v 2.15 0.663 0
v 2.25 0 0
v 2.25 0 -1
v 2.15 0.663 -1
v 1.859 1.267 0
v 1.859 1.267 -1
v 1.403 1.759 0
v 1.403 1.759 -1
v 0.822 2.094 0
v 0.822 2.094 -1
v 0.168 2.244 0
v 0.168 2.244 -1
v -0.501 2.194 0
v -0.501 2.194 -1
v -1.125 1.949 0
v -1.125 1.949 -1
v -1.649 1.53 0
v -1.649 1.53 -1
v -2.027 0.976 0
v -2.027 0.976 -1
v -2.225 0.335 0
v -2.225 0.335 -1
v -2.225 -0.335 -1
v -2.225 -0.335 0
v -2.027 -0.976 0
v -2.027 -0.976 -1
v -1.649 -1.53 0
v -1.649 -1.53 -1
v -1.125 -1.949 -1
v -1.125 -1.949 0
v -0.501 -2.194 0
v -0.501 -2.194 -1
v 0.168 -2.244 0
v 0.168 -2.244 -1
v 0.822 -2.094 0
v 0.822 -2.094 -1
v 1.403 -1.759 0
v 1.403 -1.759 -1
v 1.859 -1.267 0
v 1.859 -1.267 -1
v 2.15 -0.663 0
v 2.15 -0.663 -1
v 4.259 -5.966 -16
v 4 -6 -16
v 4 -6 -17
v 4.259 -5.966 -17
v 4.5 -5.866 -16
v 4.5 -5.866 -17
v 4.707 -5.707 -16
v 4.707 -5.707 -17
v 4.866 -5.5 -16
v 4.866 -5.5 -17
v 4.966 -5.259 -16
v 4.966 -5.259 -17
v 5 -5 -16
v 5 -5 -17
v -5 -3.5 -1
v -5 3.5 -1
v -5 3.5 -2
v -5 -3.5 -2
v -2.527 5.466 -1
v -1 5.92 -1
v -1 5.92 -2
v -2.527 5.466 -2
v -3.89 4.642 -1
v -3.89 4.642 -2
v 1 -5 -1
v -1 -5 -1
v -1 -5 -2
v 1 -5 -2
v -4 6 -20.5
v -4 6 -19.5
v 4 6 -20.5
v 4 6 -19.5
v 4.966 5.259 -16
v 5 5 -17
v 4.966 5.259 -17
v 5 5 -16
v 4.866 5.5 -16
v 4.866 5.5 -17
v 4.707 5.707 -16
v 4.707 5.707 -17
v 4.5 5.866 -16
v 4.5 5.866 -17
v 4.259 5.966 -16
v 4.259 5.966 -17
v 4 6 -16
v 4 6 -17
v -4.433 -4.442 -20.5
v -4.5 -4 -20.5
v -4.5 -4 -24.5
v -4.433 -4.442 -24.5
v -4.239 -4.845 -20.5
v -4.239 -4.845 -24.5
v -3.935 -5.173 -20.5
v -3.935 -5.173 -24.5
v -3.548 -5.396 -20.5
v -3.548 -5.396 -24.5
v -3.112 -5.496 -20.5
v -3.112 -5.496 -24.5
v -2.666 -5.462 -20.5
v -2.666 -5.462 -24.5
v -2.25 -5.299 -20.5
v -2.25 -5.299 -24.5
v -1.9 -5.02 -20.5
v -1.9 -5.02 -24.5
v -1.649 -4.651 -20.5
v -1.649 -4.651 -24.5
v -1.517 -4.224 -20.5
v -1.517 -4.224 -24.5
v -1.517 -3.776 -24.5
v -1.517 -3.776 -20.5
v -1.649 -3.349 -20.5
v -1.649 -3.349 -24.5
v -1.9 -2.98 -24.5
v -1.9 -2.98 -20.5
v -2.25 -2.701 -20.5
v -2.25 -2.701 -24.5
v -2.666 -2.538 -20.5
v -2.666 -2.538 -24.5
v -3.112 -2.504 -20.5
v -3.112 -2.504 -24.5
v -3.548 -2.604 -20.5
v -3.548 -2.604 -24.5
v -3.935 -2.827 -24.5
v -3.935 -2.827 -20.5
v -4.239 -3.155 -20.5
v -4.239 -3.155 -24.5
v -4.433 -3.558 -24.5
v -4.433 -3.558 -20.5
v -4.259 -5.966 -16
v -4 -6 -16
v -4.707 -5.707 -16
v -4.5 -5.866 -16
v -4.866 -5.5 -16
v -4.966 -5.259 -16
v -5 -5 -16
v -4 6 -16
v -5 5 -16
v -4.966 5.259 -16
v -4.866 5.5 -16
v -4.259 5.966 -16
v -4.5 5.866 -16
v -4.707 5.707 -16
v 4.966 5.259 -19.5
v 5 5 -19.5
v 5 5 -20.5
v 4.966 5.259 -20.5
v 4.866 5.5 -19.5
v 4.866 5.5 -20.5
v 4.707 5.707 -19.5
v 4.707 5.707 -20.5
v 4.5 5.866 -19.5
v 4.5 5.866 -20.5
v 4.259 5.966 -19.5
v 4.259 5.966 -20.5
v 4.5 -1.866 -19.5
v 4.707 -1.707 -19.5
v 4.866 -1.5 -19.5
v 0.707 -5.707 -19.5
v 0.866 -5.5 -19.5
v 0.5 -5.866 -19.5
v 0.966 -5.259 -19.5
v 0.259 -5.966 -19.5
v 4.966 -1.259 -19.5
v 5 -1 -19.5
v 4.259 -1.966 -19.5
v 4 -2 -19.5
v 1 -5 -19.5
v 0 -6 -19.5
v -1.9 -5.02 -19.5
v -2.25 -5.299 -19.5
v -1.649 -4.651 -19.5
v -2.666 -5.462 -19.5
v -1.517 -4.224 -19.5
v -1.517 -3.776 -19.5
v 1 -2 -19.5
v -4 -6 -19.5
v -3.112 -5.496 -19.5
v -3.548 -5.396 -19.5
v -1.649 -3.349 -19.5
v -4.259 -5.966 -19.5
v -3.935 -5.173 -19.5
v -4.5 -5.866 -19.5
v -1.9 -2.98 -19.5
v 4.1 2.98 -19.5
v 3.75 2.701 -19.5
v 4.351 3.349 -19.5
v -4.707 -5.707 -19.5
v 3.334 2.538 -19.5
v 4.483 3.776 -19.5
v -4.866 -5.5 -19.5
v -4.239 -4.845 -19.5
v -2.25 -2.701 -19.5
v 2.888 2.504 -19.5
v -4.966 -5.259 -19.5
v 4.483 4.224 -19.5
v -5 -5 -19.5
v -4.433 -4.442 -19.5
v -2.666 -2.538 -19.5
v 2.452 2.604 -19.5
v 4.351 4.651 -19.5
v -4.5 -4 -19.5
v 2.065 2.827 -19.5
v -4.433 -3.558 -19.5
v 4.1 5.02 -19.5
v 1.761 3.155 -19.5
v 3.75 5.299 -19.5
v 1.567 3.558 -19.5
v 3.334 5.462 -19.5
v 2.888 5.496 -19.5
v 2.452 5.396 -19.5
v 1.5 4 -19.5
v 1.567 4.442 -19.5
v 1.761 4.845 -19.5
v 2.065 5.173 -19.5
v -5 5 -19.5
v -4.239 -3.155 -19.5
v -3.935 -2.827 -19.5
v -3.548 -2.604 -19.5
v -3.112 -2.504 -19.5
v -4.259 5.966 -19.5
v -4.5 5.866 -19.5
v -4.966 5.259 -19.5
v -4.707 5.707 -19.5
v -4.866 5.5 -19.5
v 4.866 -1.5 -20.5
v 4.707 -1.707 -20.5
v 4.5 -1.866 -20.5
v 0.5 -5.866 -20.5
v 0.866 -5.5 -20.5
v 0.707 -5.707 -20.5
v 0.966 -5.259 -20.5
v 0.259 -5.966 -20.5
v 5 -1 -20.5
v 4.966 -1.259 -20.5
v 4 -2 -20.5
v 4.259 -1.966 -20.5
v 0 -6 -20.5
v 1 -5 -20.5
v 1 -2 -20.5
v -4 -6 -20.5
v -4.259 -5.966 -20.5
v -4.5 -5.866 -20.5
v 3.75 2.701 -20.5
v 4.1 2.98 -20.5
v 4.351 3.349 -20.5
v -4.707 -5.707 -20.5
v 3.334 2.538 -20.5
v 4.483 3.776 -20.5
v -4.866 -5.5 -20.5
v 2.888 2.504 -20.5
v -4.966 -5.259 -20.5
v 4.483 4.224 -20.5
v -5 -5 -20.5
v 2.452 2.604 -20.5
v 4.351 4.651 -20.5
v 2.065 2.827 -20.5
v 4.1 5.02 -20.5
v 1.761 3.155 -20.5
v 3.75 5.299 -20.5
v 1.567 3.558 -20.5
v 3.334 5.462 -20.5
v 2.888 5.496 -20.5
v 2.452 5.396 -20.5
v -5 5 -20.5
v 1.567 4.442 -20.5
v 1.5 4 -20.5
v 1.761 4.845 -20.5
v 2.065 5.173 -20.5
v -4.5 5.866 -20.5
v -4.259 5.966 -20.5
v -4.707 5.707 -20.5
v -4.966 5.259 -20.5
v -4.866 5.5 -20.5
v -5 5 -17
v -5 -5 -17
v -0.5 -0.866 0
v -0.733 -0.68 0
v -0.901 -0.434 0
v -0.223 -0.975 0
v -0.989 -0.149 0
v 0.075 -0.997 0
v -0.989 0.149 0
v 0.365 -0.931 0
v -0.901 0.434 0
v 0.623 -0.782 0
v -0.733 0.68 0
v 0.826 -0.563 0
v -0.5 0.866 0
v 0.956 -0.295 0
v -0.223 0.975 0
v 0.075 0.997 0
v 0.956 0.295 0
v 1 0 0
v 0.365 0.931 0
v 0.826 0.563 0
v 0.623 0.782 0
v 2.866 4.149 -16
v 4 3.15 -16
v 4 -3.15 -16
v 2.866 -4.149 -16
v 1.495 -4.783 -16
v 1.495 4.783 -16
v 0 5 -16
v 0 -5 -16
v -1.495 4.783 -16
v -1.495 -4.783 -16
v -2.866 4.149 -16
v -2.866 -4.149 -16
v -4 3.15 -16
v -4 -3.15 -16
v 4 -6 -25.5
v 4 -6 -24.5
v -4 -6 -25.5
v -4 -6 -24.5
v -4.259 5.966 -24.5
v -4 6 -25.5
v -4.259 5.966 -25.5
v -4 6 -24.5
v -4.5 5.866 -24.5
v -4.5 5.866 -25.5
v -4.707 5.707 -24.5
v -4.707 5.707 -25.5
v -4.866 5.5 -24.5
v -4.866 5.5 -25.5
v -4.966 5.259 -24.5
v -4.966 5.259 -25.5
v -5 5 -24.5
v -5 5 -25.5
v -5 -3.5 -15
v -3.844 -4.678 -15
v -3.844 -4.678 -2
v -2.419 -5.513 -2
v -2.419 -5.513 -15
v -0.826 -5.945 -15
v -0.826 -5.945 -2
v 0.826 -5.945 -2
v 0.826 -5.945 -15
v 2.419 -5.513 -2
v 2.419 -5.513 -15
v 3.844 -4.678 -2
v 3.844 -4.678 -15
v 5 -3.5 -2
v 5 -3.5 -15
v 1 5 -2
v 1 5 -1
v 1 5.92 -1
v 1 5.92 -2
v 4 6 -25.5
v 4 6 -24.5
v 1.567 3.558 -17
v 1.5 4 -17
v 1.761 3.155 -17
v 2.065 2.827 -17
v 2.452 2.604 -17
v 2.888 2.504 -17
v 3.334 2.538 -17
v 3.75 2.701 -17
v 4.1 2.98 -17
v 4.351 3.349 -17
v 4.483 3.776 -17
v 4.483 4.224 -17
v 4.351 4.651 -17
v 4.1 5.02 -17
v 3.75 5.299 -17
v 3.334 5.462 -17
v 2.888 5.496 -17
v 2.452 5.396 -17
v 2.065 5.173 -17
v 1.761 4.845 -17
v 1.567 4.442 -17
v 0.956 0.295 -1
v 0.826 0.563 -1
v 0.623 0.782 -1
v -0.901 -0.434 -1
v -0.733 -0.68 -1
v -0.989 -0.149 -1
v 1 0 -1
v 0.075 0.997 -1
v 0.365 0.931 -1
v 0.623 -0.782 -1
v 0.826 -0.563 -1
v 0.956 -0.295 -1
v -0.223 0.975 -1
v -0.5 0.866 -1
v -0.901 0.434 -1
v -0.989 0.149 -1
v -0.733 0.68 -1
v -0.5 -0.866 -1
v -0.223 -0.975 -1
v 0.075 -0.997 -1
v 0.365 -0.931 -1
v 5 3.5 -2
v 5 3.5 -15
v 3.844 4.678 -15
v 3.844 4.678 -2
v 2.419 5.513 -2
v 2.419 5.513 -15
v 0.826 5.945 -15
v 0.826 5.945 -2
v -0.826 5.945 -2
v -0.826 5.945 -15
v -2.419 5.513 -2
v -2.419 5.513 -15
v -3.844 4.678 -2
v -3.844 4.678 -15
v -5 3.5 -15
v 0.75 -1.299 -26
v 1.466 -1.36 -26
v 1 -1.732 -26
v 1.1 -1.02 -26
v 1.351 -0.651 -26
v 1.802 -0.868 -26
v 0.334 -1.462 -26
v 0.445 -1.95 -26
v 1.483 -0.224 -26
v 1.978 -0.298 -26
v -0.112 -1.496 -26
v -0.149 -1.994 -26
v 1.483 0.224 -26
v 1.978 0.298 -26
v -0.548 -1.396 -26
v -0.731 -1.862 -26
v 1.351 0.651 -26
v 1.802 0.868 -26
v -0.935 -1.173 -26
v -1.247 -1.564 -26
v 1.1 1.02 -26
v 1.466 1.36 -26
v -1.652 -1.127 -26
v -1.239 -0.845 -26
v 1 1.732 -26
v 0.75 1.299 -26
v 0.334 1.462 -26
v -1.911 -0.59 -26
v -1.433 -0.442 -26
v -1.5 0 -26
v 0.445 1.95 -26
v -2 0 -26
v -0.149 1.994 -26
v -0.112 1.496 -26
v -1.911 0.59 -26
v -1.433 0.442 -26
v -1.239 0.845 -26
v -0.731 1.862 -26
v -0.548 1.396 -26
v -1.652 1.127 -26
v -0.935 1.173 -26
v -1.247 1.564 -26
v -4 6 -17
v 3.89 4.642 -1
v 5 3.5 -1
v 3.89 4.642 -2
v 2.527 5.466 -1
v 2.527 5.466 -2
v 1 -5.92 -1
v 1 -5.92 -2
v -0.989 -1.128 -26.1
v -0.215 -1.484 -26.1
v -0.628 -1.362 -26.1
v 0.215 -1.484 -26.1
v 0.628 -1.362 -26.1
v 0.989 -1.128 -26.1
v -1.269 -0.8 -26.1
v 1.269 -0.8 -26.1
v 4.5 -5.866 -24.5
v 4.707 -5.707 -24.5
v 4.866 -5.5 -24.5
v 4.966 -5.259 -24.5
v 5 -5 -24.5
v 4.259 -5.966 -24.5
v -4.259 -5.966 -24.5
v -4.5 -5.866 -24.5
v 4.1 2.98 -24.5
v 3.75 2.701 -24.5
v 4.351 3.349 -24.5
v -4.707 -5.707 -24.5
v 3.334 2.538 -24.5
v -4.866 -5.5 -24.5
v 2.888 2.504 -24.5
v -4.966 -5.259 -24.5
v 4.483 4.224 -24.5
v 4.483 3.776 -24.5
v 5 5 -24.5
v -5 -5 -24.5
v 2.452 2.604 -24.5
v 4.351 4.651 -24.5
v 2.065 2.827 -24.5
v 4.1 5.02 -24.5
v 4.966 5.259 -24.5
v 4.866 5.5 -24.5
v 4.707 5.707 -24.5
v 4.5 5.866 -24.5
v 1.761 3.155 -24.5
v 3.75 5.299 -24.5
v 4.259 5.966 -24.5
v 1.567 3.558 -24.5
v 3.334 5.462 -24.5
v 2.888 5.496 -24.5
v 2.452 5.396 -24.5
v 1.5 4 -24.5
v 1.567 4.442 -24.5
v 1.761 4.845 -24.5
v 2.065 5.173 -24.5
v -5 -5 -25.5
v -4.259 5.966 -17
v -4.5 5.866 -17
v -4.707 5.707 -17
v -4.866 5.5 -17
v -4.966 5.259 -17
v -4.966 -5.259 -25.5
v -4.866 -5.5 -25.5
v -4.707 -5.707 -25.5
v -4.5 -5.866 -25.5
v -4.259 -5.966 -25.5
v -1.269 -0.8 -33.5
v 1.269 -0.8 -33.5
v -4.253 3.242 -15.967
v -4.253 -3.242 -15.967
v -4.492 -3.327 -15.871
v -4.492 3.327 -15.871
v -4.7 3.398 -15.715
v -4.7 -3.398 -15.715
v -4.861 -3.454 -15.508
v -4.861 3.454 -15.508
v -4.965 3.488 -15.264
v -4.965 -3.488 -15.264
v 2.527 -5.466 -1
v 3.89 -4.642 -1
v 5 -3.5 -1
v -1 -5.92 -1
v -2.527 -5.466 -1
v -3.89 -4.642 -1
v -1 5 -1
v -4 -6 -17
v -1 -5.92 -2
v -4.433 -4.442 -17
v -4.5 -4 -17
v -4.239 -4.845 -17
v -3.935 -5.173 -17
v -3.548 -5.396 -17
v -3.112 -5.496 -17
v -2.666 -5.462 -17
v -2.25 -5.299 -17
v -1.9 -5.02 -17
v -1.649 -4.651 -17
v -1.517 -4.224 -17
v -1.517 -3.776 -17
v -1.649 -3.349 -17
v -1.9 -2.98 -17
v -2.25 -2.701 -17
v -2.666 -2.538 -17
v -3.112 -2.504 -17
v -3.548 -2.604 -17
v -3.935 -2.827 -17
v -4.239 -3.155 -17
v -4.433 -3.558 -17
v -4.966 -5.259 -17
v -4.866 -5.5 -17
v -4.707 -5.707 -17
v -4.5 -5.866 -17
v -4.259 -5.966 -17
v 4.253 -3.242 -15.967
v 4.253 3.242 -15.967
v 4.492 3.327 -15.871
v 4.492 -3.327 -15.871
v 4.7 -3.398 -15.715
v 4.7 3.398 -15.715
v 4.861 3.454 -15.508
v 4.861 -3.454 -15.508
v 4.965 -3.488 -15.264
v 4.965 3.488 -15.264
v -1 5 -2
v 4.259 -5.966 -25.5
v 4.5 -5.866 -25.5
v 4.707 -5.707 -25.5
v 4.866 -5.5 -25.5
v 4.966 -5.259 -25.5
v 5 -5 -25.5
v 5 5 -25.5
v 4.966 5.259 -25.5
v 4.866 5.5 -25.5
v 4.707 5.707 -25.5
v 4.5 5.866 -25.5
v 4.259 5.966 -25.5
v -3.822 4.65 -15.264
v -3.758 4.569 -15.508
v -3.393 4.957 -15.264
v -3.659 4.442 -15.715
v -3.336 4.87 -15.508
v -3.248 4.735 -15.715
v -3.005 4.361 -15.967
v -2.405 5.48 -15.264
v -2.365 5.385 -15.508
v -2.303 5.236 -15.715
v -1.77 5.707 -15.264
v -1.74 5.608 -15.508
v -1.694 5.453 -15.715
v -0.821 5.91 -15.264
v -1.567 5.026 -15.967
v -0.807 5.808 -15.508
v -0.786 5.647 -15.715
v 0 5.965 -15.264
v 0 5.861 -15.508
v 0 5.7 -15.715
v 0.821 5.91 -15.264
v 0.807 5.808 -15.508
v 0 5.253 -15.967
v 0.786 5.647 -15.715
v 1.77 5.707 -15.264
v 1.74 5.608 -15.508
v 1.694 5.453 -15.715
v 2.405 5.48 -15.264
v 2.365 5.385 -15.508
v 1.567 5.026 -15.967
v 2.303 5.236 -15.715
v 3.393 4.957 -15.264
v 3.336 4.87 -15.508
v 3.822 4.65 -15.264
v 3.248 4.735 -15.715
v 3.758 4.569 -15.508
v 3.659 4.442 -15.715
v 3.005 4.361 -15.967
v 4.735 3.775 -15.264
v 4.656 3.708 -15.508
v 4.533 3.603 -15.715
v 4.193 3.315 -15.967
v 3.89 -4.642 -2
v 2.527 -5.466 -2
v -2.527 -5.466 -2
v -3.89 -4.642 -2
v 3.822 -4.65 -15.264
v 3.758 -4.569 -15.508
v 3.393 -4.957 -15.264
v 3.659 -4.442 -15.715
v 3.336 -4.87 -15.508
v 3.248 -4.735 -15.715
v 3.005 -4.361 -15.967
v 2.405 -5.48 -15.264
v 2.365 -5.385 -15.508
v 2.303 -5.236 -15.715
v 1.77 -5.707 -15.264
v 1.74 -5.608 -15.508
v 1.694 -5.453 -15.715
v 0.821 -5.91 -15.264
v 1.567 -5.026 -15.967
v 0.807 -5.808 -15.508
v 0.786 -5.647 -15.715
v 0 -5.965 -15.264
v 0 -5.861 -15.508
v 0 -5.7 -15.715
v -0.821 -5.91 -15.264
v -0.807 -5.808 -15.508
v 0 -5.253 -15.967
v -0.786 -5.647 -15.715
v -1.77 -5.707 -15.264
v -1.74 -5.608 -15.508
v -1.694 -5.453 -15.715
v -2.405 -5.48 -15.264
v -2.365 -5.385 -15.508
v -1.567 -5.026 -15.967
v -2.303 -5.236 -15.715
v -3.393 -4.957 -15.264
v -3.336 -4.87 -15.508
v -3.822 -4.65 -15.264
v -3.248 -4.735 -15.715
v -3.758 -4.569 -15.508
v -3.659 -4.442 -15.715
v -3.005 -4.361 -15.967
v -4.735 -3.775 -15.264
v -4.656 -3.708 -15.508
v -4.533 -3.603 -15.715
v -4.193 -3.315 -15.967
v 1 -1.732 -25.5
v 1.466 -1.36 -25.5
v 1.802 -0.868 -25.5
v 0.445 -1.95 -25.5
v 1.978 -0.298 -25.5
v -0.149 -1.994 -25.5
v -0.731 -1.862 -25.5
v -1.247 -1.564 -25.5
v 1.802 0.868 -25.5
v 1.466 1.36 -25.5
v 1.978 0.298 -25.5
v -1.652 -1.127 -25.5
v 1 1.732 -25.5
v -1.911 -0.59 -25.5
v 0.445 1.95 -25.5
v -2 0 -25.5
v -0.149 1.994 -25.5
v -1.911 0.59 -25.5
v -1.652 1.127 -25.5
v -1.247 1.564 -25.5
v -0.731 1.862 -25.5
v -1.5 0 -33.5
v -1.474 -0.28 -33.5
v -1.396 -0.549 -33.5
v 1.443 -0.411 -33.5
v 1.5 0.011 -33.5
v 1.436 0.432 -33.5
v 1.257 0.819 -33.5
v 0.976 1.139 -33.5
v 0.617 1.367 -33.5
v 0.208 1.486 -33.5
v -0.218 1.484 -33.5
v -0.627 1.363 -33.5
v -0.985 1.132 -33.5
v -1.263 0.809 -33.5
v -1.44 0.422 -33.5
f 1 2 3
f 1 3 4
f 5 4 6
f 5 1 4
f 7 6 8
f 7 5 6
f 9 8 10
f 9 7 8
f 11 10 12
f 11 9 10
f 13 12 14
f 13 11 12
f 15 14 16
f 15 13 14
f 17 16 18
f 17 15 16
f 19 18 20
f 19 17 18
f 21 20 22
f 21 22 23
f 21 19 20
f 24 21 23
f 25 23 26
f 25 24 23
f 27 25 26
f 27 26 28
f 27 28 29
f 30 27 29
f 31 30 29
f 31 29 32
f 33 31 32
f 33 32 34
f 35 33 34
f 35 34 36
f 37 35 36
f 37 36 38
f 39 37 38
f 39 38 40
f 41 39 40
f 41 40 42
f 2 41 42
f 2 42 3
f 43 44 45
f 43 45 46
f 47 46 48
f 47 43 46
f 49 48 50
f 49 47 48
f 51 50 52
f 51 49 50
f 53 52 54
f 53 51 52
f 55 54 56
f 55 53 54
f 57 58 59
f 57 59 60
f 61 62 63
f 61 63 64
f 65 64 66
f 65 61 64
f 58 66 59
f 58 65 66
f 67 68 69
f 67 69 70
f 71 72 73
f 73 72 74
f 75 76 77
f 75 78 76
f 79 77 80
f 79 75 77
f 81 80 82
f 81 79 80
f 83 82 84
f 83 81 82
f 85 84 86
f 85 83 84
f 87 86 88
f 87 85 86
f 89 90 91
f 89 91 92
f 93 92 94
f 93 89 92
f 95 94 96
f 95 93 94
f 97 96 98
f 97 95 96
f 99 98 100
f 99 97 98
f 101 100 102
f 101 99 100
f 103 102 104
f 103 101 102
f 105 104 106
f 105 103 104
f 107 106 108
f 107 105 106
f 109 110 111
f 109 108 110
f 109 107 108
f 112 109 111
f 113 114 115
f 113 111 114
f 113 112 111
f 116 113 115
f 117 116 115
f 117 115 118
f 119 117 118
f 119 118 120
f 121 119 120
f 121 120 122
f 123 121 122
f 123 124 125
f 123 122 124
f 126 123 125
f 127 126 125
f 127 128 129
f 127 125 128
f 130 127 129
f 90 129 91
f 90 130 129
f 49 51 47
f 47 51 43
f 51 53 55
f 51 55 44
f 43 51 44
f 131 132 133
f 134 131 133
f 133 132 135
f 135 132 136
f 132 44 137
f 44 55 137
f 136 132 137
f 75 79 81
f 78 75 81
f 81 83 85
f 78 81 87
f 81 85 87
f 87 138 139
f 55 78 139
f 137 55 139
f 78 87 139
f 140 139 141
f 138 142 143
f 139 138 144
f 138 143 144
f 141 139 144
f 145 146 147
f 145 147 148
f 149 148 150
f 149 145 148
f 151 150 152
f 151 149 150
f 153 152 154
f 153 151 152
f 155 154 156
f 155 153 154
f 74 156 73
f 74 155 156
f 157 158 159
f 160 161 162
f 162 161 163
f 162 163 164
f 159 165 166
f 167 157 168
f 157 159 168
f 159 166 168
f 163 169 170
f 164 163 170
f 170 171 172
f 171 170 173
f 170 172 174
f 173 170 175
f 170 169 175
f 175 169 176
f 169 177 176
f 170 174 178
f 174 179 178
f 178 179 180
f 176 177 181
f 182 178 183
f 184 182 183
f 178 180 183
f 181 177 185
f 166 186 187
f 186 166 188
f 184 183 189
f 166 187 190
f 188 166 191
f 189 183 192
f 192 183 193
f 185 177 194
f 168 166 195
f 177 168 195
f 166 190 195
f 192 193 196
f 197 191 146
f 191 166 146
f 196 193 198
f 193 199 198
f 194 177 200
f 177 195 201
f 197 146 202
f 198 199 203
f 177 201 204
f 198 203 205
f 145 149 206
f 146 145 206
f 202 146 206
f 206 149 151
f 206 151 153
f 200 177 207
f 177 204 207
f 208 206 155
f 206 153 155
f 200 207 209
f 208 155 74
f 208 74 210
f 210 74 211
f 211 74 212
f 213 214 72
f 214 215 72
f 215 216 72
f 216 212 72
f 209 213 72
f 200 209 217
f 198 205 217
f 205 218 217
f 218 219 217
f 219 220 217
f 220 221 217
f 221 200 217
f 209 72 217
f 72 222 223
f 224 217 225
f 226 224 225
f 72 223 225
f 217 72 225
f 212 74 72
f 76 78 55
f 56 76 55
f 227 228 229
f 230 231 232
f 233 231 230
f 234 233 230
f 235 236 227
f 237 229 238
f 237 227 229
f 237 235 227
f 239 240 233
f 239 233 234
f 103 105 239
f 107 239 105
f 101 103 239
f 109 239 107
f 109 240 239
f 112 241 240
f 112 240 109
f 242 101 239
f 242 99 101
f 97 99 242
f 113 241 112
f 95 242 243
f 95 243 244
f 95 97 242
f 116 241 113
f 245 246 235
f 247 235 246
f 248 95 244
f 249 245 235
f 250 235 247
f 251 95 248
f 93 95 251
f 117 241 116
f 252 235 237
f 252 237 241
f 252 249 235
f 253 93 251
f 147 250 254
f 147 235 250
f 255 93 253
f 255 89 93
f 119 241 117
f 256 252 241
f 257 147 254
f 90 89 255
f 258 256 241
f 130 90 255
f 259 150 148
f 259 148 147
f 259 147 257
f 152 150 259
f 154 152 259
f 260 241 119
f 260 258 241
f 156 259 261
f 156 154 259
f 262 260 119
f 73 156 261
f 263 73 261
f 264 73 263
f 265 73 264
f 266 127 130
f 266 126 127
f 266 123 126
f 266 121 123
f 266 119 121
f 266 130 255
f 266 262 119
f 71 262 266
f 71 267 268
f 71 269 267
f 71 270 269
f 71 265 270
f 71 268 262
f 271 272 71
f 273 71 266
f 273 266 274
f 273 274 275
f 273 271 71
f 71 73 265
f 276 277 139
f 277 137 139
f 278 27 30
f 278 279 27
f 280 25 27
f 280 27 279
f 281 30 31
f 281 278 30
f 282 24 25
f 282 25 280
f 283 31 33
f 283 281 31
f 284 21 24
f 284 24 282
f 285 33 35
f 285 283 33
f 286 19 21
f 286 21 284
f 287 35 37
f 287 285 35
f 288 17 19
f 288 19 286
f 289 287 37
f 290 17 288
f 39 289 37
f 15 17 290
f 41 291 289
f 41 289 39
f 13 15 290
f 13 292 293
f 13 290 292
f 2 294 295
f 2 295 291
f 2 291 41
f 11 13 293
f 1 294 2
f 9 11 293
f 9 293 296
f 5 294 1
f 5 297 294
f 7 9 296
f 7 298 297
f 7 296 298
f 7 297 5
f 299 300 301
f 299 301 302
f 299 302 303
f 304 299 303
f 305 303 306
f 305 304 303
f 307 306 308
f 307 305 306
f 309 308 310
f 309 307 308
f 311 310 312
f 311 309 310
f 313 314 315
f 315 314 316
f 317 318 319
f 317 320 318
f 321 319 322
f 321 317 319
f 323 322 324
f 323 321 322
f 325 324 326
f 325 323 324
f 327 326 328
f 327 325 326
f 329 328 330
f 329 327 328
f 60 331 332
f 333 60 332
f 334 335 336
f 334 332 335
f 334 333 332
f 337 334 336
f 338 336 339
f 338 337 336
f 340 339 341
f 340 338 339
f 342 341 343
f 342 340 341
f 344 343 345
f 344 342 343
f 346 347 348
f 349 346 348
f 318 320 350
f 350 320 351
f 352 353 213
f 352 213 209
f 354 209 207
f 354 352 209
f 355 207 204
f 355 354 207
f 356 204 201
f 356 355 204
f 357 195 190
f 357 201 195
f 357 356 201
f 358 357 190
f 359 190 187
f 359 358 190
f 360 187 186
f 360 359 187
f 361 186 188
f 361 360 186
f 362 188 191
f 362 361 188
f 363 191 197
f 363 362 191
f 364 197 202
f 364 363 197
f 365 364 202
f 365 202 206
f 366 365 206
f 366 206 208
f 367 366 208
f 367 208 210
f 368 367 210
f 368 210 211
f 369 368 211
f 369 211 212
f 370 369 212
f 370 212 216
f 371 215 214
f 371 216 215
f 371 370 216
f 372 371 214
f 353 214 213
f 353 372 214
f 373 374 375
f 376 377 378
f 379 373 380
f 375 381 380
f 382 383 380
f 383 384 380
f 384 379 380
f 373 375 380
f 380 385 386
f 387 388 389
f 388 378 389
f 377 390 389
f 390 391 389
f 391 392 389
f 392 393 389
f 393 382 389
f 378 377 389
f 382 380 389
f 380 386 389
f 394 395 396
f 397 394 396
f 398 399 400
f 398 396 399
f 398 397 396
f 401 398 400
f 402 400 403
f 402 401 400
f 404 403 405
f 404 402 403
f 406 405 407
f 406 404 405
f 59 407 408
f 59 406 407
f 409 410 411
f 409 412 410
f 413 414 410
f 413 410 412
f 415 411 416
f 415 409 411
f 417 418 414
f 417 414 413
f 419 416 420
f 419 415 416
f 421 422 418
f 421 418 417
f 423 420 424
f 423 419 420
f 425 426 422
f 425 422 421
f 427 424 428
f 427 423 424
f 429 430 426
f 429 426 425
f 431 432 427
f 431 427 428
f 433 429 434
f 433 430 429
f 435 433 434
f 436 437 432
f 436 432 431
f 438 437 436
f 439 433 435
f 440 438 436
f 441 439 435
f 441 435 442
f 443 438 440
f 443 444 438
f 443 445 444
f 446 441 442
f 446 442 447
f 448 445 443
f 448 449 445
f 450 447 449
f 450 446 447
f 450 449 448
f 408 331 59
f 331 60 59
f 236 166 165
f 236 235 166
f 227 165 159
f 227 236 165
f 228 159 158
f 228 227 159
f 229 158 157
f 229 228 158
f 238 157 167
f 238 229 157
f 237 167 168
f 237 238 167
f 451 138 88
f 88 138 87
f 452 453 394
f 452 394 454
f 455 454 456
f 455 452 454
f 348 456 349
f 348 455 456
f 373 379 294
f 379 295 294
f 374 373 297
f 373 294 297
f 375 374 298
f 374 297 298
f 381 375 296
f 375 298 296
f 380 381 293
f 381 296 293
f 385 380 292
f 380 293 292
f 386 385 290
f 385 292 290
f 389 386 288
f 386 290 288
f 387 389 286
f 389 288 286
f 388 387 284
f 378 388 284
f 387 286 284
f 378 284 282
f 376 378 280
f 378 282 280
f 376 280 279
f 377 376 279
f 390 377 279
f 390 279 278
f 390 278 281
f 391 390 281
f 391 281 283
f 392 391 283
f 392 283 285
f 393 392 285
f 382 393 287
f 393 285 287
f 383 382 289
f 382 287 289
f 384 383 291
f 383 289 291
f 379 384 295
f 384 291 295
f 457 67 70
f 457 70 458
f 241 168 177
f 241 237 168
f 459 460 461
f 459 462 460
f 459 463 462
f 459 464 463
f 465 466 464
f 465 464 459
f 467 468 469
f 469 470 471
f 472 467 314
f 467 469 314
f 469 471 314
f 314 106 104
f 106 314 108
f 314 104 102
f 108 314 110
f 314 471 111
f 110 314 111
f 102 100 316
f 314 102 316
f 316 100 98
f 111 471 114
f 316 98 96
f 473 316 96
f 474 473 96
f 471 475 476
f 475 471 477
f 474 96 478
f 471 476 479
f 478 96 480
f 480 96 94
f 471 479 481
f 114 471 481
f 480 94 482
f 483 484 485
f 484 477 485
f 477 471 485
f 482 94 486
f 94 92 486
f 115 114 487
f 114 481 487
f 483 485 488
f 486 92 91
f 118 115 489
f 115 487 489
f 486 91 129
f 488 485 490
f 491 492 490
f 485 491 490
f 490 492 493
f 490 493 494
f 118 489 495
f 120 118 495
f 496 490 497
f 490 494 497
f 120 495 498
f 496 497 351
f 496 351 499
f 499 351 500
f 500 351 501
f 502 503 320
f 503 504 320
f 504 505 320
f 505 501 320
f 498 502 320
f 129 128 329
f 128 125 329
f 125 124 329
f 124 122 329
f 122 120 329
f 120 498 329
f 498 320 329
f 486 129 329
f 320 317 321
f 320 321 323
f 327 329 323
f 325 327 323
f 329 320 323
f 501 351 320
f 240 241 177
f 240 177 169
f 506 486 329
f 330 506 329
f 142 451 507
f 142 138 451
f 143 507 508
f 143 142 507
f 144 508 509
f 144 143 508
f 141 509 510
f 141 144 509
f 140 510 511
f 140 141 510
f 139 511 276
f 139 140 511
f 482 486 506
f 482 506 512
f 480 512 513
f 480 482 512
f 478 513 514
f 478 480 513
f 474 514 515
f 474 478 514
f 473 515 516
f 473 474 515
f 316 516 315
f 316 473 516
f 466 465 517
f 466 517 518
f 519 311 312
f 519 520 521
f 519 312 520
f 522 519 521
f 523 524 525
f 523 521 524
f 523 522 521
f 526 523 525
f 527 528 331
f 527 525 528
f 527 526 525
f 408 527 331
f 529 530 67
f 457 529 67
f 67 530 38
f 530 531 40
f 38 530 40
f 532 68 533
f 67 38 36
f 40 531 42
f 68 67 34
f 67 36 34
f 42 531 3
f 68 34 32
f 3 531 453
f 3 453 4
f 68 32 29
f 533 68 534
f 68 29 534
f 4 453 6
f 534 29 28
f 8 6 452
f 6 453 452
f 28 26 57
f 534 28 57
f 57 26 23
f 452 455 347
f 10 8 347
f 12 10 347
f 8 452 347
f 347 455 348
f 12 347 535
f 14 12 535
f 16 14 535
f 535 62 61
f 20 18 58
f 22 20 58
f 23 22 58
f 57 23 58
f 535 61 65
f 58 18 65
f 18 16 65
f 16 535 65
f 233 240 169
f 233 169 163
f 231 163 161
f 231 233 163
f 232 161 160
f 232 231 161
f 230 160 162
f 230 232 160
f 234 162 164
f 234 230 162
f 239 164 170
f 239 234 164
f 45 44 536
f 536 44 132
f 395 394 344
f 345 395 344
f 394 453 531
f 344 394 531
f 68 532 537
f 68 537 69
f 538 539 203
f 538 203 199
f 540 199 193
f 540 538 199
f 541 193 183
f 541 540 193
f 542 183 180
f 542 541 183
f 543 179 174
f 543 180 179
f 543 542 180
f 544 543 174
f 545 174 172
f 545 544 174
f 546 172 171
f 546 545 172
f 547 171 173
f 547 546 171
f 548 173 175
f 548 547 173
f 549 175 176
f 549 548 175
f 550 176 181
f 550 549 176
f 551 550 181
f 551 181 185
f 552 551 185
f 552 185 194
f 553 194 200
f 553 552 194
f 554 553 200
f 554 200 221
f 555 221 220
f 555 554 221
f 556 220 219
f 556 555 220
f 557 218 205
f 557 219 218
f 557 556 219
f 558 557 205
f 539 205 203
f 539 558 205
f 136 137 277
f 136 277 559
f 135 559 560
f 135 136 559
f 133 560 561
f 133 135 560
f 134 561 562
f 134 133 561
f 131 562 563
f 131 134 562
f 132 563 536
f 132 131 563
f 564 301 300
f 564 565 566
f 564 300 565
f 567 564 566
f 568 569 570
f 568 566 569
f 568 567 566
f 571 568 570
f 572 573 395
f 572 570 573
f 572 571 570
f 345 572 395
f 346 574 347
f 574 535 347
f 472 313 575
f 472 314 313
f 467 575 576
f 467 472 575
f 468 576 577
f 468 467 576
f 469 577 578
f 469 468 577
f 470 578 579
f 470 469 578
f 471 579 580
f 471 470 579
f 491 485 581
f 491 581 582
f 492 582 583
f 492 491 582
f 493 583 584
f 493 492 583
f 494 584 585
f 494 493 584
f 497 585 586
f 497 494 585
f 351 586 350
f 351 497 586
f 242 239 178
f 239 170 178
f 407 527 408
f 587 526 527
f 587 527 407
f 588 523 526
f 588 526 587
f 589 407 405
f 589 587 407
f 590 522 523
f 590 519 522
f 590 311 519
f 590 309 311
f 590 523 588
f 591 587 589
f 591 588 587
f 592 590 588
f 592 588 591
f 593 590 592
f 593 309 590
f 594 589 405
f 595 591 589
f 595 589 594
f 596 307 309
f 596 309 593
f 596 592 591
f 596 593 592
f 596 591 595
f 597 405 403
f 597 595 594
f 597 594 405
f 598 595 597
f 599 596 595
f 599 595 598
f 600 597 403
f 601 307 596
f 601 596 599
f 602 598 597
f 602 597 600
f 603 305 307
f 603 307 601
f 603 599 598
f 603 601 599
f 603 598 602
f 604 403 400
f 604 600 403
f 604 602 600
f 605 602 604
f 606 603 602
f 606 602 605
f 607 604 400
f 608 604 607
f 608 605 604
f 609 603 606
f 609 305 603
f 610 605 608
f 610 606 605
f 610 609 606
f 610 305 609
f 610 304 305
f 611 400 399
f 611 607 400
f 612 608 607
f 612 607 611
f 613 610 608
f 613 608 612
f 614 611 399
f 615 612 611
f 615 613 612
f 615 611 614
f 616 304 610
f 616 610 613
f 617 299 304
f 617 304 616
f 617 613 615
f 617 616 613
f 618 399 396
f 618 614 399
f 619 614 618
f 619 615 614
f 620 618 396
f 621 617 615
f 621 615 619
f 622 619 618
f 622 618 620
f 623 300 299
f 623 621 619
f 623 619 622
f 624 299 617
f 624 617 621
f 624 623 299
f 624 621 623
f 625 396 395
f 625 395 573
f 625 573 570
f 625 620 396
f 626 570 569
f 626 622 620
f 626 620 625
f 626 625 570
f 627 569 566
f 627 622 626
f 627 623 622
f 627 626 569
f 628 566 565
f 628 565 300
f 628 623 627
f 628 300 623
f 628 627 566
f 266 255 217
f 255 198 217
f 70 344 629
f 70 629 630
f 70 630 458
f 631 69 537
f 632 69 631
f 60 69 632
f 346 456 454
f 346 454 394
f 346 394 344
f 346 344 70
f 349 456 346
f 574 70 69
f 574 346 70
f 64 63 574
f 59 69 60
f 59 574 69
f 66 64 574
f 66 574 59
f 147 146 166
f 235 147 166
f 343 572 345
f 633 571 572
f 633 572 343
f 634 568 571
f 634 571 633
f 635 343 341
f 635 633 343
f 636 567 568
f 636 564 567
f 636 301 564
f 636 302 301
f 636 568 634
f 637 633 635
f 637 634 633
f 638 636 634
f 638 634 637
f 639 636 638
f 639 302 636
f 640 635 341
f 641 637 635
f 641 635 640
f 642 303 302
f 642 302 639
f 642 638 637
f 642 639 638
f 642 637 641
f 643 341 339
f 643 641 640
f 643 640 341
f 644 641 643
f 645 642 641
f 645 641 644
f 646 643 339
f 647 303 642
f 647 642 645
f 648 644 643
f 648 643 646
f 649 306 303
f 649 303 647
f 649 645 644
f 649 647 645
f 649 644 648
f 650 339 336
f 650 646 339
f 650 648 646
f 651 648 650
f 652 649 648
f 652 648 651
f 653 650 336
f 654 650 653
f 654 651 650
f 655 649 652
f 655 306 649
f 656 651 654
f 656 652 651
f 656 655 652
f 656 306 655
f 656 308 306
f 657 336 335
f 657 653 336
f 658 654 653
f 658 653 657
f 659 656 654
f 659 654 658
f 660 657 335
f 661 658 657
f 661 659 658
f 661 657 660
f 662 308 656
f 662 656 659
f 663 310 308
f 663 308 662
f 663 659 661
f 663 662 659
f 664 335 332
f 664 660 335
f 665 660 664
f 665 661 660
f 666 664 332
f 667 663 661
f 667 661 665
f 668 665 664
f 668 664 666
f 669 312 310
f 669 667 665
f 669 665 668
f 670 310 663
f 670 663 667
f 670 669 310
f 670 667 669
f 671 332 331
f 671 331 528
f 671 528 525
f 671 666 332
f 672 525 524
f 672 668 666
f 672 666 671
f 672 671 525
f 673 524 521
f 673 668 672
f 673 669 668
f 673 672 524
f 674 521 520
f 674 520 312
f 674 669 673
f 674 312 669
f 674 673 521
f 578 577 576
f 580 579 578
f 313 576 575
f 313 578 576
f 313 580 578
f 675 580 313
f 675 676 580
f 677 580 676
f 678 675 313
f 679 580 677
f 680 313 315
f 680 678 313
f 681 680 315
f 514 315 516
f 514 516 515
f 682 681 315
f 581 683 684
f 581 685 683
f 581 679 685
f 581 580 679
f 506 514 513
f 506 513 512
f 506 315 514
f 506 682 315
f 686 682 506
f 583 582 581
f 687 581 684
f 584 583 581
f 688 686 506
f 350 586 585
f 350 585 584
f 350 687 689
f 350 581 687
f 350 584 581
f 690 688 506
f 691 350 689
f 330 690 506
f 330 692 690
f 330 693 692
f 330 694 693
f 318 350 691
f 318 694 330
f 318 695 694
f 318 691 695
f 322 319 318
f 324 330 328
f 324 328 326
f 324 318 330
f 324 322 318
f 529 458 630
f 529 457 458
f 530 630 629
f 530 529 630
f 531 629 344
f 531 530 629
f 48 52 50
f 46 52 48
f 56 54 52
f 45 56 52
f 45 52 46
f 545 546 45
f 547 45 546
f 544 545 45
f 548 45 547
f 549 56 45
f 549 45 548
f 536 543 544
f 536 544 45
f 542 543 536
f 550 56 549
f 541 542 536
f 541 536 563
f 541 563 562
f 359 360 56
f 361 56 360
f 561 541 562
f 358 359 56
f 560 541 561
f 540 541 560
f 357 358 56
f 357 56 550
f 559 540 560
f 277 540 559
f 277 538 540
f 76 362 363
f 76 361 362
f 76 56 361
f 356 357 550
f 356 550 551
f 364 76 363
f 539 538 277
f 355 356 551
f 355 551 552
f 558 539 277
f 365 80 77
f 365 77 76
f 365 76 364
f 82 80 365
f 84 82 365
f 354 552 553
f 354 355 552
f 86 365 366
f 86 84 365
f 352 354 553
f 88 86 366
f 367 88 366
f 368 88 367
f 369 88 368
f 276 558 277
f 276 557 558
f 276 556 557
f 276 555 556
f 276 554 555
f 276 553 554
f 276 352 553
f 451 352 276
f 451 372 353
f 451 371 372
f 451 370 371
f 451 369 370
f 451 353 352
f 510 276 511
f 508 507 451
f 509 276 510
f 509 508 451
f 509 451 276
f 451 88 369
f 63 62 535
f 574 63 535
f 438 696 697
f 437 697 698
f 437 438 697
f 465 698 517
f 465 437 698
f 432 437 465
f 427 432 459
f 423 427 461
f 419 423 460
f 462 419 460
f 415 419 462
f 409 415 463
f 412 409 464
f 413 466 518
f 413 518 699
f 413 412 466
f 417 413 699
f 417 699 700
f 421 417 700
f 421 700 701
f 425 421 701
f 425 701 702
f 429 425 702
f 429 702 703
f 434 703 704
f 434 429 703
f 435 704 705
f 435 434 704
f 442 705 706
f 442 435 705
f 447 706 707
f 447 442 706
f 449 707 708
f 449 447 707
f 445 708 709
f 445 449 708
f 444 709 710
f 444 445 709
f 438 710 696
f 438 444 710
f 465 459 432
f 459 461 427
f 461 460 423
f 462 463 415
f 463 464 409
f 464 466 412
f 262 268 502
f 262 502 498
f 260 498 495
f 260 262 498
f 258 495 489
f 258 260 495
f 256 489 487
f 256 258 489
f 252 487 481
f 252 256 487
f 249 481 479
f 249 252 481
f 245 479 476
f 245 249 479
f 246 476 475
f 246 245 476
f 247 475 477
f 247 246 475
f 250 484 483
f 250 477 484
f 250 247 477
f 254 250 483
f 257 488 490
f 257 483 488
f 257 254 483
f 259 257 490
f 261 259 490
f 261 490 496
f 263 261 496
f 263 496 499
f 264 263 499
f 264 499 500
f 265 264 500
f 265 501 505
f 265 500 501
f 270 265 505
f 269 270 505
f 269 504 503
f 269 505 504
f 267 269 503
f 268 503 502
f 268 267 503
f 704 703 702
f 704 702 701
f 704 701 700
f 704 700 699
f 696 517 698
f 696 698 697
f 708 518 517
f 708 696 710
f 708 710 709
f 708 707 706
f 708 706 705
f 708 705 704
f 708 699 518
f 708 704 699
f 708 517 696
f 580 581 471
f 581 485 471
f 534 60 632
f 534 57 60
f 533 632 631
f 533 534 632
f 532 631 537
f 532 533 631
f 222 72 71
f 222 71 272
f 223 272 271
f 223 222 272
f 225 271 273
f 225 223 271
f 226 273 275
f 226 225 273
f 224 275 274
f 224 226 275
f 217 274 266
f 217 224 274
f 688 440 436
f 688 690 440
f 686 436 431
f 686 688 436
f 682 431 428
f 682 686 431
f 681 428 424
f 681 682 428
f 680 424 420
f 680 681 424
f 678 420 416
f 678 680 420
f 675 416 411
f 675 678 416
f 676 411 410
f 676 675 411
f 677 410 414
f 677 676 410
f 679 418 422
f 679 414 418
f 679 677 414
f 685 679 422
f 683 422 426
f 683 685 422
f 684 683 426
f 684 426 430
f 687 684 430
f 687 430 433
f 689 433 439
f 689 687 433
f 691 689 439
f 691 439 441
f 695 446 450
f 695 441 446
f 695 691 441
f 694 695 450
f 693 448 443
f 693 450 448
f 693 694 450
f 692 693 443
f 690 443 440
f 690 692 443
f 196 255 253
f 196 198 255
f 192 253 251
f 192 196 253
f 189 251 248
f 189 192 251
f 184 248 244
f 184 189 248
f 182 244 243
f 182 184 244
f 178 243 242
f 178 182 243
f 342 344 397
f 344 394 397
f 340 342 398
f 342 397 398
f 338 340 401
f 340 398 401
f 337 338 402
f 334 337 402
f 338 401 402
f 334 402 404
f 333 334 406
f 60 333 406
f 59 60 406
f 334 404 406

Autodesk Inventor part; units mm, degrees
ref_plane "YZ Plane" through (0, 0, 0) normal (1, 0, 0) x (0, 1, 0)
ref_plane "XZ Plane" through (0, 0, 0) normal (0, 1, 0) x (-1, 0, 0)
ref_plane "XY Plane" through (0, 0, 0) normal (0, 0, 1) x (1, 0, 0)
sketch "草图1" plane through (0, 0, 0) normal (0, 0, 1) x (1, 0, 0)
  circle A0 centre (0, 0) radius 2.25
  circle A1 centre (0, 0) radius 1
  dimension "d0" = 4.5
  dimension "d1" = 2
extrude "拉伸1" add sketch "草图1" against normal blind 1
sketch "草图2" plane through (0, 0, -1) normal (0, 0, -1) x (-1, 0, 0)
  line L0 (5, 3.5) -> (5, -3.5)
  line L1 (-5, 3.5) -> (-5, -3.5)
  line L2 (5, -3.5) -> (-5, -3.5) construction
  line L3 (5, 3.5) -> (-5, 3.5) construction
  line L4 (0, 0) -> (0, 19.9498)
  line L5 (0, 0) -> (7.1401, 0)
  line L6 (1, 5.9195) -> (1, 5)
  line L7 (1, 5) -> (-1, 5)
  line L8 (-1, 5) -> (-1, 5.9195)
  arc A0 (5, 3.5) -> (1, 5.9195) centre (0, -0.25) ccw
  arc A1 (-1, 5.9195) -> (-5, 3.5) centre (0, -0.25) ccw
  line L9 (1, -5.9195) -> (1, -5)
  line L10 (1, -5) -> (-1, -5)
  line L11 (-1, -5) -> (-1, -5.9195)
  arc A2 (-5, -3.5) -> (-1, -5.9195) centre (0, 0.25) ccw
  arc A3 (1, -5.9195) -> (5, -3.5) centre (0, 0.25) ccw
  point P0 (0, 6)
  point P1 (0, 6)
  dimension "d4" = 10
  dimension "d7" = 7
  dimension "d8" = 6
  dimension "d9" = 1
  dimension "d10" = 2
extrude "拉伸2" add sketch "草图2" along normal blind 1
sketch "草图3" plane through (0, 0, -2) normal (0, 0, -1) x (-1, 0, 0)
  line L0 (1, 5) -> (-1, 5) construction
  line L1 (-1, 5) -> (-1, 5.9195) construction
  arc A0 (-1, 5.9195) -> (-5, 3.5) centre (0, -0.25) ccw construction
  line L2 (-5, 3.5) -> (-5, -3.5) projected
  arc A1 (-5, -3.5) -> (-1, -5.9195) centre (0, 0.25) ccw construction
  line L3 (-1, -5.9195) -> (-1, -5) construction
  line L4 (-1, -5) -> (1, -5) construction
  line L5 (1, -5) -> (1, -5.9195) construction
  arc A2 (1, -5.9195) -> (5, -3.5) centre (0, 0.25) ccw construction
  line L6 (5, -3.5) -> (5, 3.5) projected
  arc A3 (5, 3.5) -> (1, 5.9195) centre (0, -0.25) ccw construction
  line L7 (1, 5.9195) -> (1, 5) construction
  arc A4 (5, 3.5) -> (-5, 3.5) centre (0, -0.25) ccw
  line L8 (0, 0) -> (3.3982, 0)
  arc A5 (-5, -3.5) -> (5, -3.5) centre (0, 0.25) ccw
extrude "拉伸3" add sketch "草图3" along normal blind 14 separate body
fillet "圆角1" radius 1 4 edges at (0, 6, -16) (-5, 0, -16) (0, -6, -16) (5, 0, -16)
sketch "草图4" plane through (0, 0, -16) normal (0, 0, -1) x (-1, 0, 0)
  line L0 (-5, 5) -> (-5, -5)
  line L1 (-4, -6) -> (4, -6)
  line L2 (5, -5) -> (5, 5)
  line L3 (4, 6) -> (-4, 6)
  line L4 (0, 0) -> (0, 19.5528)
  line L5 (0, 0) -> (-9.7016, 0)
  arc A0 (-5, -5) -> (-4, -6) centre (-4, -5) ccw
  arc A1 (-4, 6) -> (-5, 5) centre (-4, 5) ccw
  arc A2 (5, 5) -> (4, 6) centre (4, 5) ccw
  arc A3 (4, -6) -> (5, -5) centre (4, -5) ccw
  dimension "d16" = 1
  dimension "d17" = 10
  dimension "d18" = 12
extrude "拉伸4" add sketch "草图4" along normal blind 1 separate body
sketch "草图5" plane through (0, 0, -17) normal (0, 0, -1) x (-1, 0, 0)
  circle A0 centre (3, -4) radius 1.5
  circle A1 centre (-3, 4) radius 1.5
  line L0 (5, -5) -> (5, 5) projected
  line L1 (-4, -6) -> (4, -6) projected
  line L2 (4, 6) -> (-4, 6) projected
  line L3 (-5, 5) -> (-5, -5) projected
  point P0 (0, 0)
  dimension "d21" = 3
  dimension "d22" = 2
  dimension "d23" = 2
  dimension "d24" = 2
  dimension "d25" = 2
extrude "拉伸5" add sketch "草图5" along normal blind 2.5 bodies 3
sketch "草图6" plane through (-3, -4, -19.5) normal (0, 0, -1) x (-1, 0, 0)
  circle A0 centre (-6, 8) radius 1.5 construction
  circle A1 centre (0, 0) radius 1.5 construction
  line L0 (-8, 9) -> (-8, -1) projected
  arc A2 (-8, -1) -> (-7, -2) centre (-7, -1) ccw projected
  line L1 (-7, -2) -> (1, -2) projected
  arc A3 (1, -2) -> (2, -1) centre (1, -1) ccw projected
  line L2 (2, -1) -> (2, 9) projected
  arc A4 (2, 9) -> (1, 10) centre (1, 9) ccw projected
  line L3 (1, 10) -> (-7, 10) projected
  arc A5 (-7, 10) -> (-8, 9) centre (-7, 9) ccw projected
  point P0 (-3, 4)
extrude "拉伸6" add sketch "草图6" along normal blind 1 bodies 3
sketch "草图7" plane through (-3, -4, -20.5) normal (0, 0, -1) x (-1, 0, 0)
  circle A0 centre (0, 0) radius 1.5 projected
  circle A1 centre (-6, 8) radius 1.5 projected
  point P0 (-3, 4)
extrude "拉伸7" add sketch "草图7" along normal blind 4 bodies 3
sketch "草图8" plane through (-3, -4, -24.5) normal (0, 0, -1) x (-1, 0, 0)
  circle A0 centre (-6, 8) radius 1.5 construction
  circle A1 centre (0, 0) radius 1.5 construction
  arc A2 (-8, -1) -> (-7, -2) centre (-7, -1) ccw projected
  line L0 (-7, -2) -> (1, -2) projected
  arc A3 (1, -2) -> (2, -1) centre (1, -1) ccw projected
  line L1 (2, -1) -> (2, 9) projected
  arc A4 (2, 9) -> (1, 10) centre (1, 9) ccw projected
  line L2 (1, 10) -> (-7, 10) projected
  arc A5 (-7, 10) -> (-8, 9) centre (-7, 9) ccw projected
  line L3 (-8, 9) -> (-8, -1) projected
  point P0 (-3, 4)
extrude "拉伸8" add sketch "草图8" along normal blind 1 bodies 3
sketch "草图9" plane through (-3, -4, -25.5) normal (0, 0, -1) x (-1, 0, 0)
  circle A0 centre (-3, 4) radius 1 projected
  circle A1 centre (-3, 4) radius 2
  circle A2 centre (-3, 4) radius 1.5
  dimension "d34" = 4
  dimension "d35" = 3
extrude "拉伸9" add sketch "草图9" along normal blind 0.5 contours A1 bodies 3
sketch "草图10" plane through (0, 0, -25.5) normal (0, 0, -1) x (-1, 0, 0)
  circle A0 centre (0, 0) radius 1.5
  circle A1 centre (0, 0) radius 1.5 projected
  line L0 (1.2689, -0.8) -> (-1.2689, -0.8)
  point P0 (1.2689, -0.8)
  dimension "d38" = 2.3
  dimension "d39" = 3
sketch "草图11" plane through (-3, -4, -20.5) normal (0, 0, -1) x (-1, 0, 0)
  line L0 (-7, 2) -> (-4, 2)
  line L1 (-4, 2) -> (-4, -1)
  line L2 (-7, -2) -> (1, -2) construction
  line L3 (-7, -2) -> (1, -2) projected
  arc A0 (-4, -1) -> (-3, -2) centre (-3, -1) ccw
  arc A1 (-8, 3) -> (-7, 2) centre (-7, 3) ccw
  arc A2 (-8, -1) -> (-7, -2) centre (-7, -1) ccw projected
  line L4 (-3, -2) -> (-7, -2)
  arc A3 (-8, 0.5) -> (2, 0.5) centre (-3, 4.25) ccw construction
  line L5 (-8, 9) -> (-8, -1) construction
  line L6 (-8, 3) -> (-8, -1)
  point P0 (-3, 4)
  point P1 (-8, 2)
  point P2 (-4, -2)
  dimension "d45" = 4
  dimension "d46" = 1
  dimension "d47" = 1
extrude "拉伸12" cut sketch "草图11" against normal blind 1.5 bodies 3
extrude "拉伸10" add sketch "草图10" along normal blind 0.6 bodies 3
extrude "拉伸13" add sketch "草图10" along normal blind 8 contours A0 L0 picked at (0.3589, -0.0009) bodies 3
properties part number "GA12-N20微型减速直流电机3V_15RPM"
